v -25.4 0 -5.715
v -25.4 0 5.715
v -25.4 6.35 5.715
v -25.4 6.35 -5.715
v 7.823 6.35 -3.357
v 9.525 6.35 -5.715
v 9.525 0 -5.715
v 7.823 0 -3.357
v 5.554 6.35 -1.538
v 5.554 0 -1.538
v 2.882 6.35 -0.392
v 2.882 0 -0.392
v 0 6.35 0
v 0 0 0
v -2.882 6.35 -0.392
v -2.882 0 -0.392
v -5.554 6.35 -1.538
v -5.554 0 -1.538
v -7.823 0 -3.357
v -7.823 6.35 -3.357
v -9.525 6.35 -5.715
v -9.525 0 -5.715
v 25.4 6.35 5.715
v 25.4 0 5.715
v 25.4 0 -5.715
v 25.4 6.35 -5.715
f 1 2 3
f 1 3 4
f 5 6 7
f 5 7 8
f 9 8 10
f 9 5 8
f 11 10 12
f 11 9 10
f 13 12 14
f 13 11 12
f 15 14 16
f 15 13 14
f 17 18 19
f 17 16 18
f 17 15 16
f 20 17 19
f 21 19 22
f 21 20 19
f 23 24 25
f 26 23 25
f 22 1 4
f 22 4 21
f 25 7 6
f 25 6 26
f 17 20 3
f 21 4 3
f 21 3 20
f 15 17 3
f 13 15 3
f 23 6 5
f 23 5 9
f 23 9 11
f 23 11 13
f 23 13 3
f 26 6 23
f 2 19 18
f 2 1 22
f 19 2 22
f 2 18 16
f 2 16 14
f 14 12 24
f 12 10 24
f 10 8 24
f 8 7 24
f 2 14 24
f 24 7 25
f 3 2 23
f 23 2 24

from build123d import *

# Parameters (mm, degrees)
SKETCH1_W           = 50.8
SKETCH1_H           = 11.43
BOSS_EXTRUDE1_DEPTH = 6.35
CUT_EXTRUDE1_DEPTH  = 7.35


with BuildPart() as part:
    # Sketch1 → Boss-Extrude1 (new body)
    with BuildSketch(Plane(origin=(0, 0, 0), x_dir=(1, 0, 0), z_dir=(0, 1, 0))):
        Rectangle(SKETCH1_W, SKETCH1_H)
    extrude(amount=BOSS_EXTRUDE1_DEPTH)

    # Sketch2 → Cut-Extrude1 (cut, through all)
    with BuildSketch(Plane(origin=(0, 6.35, 0), x_dir=(1, 0, 0), z_dir=(0, 1, 0))):
        with BuildLine():
            Line((-9.525, 5.715), (9.525, 5.715))
            ThreePointArc((9.525, 5.715), (0, 0), (-9.525, 5.715))
        make_face()
    extrude(amount=-CUT_EXTRUDE1_DEPTH, mode=Mode.SUBTRACT)


solid = part.part
